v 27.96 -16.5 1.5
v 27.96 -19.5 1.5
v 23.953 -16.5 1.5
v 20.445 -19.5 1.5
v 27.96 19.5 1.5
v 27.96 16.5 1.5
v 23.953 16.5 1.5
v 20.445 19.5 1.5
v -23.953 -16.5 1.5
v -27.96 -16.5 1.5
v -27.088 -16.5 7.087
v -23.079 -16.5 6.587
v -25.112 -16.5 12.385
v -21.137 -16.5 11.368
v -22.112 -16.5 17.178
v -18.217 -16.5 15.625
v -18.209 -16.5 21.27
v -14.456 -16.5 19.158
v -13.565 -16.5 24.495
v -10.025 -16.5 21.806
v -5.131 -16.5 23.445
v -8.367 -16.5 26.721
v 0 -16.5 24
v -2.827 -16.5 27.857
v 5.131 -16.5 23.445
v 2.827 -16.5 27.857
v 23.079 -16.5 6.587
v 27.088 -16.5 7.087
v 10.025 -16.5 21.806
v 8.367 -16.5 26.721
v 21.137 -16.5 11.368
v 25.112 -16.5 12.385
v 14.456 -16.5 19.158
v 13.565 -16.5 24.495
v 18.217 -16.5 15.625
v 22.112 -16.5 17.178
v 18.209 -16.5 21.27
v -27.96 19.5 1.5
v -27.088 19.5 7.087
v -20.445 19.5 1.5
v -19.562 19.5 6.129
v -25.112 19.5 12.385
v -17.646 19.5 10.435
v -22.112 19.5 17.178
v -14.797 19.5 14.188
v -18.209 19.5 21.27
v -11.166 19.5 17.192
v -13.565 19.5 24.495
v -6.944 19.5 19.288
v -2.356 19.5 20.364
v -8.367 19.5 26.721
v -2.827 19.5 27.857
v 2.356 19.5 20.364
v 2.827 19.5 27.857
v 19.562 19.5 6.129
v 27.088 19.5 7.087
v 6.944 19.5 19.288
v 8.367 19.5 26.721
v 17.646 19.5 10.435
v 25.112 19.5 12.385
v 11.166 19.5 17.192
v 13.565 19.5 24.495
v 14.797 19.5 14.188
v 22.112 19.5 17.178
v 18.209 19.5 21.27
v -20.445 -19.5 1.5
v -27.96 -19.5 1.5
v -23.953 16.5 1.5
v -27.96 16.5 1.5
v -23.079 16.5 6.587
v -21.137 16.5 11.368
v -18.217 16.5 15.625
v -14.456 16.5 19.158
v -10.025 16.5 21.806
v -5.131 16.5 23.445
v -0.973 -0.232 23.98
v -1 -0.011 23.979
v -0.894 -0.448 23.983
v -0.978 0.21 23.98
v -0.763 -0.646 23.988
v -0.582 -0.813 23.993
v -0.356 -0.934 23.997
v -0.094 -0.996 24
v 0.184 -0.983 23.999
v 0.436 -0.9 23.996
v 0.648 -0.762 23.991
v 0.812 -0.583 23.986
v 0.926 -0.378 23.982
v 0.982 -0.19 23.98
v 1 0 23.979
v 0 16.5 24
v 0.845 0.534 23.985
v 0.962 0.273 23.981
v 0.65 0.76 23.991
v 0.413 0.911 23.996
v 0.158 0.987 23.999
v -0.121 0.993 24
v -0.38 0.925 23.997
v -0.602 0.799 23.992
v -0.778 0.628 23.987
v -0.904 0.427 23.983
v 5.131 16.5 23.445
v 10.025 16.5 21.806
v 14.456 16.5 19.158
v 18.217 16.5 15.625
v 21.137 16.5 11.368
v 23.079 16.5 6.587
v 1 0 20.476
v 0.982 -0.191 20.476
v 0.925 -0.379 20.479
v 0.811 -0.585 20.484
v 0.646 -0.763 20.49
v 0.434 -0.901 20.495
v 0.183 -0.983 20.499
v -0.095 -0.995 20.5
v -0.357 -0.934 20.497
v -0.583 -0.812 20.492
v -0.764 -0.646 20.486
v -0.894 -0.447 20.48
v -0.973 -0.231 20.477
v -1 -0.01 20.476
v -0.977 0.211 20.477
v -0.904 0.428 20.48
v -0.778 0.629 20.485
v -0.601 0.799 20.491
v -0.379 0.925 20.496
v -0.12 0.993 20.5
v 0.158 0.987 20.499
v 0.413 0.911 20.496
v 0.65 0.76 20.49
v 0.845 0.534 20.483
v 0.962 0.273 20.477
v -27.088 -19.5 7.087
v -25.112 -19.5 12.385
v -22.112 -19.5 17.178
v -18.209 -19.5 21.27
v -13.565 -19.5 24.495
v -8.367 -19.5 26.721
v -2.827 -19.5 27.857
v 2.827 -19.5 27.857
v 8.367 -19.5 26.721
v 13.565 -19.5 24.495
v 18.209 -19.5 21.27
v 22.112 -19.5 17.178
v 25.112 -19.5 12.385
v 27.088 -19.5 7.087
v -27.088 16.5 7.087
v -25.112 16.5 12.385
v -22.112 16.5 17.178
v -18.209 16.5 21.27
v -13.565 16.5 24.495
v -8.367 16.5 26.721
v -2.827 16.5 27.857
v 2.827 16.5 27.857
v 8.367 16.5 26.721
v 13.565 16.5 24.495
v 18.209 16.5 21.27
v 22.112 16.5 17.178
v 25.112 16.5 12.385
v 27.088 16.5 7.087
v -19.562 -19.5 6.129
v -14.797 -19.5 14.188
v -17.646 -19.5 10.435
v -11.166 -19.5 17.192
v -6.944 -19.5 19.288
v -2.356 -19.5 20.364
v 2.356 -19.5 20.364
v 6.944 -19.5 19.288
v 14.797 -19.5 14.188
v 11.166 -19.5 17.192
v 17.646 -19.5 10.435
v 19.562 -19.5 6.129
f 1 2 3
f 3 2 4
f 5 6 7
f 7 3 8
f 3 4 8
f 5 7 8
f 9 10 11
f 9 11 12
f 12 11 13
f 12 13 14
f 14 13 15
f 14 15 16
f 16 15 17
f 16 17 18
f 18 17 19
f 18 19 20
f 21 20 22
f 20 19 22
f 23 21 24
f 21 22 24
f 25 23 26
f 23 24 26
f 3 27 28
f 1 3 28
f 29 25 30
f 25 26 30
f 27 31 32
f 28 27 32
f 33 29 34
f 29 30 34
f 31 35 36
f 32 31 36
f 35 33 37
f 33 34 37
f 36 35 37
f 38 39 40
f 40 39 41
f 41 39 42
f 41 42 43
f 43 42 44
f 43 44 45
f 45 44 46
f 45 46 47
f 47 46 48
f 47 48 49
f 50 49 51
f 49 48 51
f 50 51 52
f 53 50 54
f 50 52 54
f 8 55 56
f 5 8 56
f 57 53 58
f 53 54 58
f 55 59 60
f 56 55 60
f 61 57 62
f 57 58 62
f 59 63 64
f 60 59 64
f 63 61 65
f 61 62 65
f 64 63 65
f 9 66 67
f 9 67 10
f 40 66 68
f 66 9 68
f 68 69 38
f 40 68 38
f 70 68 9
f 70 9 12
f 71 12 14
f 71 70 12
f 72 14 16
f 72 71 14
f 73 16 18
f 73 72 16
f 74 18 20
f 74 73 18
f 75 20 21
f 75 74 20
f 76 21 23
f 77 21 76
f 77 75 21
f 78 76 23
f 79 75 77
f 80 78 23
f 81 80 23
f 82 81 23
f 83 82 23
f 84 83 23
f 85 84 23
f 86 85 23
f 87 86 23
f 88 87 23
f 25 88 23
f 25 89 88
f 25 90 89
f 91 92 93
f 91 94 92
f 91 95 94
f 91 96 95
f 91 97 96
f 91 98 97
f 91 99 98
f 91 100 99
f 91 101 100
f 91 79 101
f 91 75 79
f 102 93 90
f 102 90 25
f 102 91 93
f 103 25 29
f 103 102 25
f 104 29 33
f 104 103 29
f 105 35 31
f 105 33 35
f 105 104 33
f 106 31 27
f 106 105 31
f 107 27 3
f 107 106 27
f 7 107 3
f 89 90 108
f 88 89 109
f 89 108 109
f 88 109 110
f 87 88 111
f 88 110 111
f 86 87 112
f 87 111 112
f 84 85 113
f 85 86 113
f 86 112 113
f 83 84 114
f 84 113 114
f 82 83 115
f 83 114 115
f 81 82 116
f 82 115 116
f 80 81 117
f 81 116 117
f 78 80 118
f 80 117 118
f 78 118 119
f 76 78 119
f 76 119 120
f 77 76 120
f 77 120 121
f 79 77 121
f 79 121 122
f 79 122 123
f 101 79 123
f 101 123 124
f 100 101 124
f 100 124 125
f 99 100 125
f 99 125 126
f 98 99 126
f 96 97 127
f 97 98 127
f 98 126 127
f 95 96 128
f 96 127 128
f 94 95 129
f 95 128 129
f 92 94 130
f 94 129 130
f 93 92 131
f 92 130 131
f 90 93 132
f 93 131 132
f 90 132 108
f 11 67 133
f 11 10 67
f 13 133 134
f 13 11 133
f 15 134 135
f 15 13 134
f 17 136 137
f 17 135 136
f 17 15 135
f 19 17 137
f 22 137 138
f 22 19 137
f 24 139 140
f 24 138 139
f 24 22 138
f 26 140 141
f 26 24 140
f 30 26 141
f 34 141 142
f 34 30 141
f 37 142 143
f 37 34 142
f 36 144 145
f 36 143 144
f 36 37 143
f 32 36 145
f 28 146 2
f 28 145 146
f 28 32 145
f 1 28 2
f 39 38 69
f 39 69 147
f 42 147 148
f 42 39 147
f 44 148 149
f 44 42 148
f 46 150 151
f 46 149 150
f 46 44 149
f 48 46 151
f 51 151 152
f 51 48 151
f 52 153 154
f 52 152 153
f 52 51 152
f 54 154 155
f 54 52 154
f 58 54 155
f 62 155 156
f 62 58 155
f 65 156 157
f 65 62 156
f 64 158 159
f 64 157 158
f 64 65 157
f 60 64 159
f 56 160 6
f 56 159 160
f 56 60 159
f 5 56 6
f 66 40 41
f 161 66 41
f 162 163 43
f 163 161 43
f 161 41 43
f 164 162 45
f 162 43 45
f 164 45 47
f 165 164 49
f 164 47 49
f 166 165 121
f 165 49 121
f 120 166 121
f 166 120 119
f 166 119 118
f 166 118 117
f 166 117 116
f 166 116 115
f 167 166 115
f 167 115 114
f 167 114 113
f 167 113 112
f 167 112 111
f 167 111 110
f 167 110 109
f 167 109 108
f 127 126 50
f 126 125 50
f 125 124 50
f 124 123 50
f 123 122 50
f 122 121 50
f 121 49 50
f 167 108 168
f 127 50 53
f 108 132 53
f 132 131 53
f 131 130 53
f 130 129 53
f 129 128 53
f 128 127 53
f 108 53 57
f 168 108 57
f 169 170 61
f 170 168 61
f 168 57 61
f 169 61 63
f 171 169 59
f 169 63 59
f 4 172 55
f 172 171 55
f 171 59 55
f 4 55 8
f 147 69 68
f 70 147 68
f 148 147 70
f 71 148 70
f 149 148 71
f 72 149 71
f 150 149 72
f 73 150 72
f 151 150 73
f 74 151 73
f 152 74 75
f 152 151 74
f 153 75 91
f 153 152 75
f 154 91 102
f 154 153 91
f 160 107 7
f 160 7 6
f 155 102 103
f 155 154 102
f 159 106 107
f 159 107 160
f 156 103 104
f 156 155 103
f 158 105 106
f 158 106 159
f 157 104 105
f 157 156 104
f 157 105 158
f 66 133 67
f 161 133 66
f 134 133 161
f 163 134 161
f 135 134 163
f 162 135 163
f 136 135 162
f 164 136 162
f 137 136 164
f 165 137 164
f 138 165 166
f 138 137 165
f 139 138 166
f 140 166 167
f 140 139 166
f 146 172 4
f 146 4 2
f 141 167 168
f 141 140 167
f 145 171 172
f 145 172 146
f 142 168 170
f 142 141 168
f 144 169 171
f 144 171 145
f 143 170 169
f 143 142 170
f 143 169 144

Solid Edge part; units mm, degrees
sketch "Sketch1" plane through (0, 0, 0) normal (0, 0, 1) x (1, 0, 0)
  line L0 (20.5, -19.5) -> (28, -19.5)
  line L1 (28, -19.5) -> (28, -16.5)
  line L2 (28, -16.5) -> (24, -16.5)
  line L3 (24, -16.5) -> (24, 16.5)
  line L4 (24, 16.5) -> (28, 16.5)
  line L5 (28, 16.5) -> (28, 19.5)
  line L6 (28, 19.5) -> (20.5, 19.5)
  line L7 (20.5, -19.5) -> (20.5, 19.5)
revolve "RevolvedProtrusion1" add sketch "Sketch1" angle 180 about axis through (0, 54, 0) along (0, -1, 0)
sketch "Sketch2" plane through (0, 0, 0) normal (0, 0, 1) x (1, 0, 0)
  circle A0 centre (0, 0) radius 1
extrude "ExtrudedCutout_1" cut sketch "Sketch2" along normal mid plane 257.4558
sketch "Sketch3" plane through (0, 0, 0) normal (1, 0, 0) x (0, 1, 0)
  line L0 (-19.5, 0) -> (-19.5, 1.5)
  line L1 (-19.5, 1.5) -> (19.5, 1.5)
  line L2 (19.5, 1.5) -> (19.5, 0)
  line L3 (19.5, 0) -> (-19.5, 0)
extrude "ExtrudedCutout_2" cut sketch "Sketch3" along normal mid plane 153.986
